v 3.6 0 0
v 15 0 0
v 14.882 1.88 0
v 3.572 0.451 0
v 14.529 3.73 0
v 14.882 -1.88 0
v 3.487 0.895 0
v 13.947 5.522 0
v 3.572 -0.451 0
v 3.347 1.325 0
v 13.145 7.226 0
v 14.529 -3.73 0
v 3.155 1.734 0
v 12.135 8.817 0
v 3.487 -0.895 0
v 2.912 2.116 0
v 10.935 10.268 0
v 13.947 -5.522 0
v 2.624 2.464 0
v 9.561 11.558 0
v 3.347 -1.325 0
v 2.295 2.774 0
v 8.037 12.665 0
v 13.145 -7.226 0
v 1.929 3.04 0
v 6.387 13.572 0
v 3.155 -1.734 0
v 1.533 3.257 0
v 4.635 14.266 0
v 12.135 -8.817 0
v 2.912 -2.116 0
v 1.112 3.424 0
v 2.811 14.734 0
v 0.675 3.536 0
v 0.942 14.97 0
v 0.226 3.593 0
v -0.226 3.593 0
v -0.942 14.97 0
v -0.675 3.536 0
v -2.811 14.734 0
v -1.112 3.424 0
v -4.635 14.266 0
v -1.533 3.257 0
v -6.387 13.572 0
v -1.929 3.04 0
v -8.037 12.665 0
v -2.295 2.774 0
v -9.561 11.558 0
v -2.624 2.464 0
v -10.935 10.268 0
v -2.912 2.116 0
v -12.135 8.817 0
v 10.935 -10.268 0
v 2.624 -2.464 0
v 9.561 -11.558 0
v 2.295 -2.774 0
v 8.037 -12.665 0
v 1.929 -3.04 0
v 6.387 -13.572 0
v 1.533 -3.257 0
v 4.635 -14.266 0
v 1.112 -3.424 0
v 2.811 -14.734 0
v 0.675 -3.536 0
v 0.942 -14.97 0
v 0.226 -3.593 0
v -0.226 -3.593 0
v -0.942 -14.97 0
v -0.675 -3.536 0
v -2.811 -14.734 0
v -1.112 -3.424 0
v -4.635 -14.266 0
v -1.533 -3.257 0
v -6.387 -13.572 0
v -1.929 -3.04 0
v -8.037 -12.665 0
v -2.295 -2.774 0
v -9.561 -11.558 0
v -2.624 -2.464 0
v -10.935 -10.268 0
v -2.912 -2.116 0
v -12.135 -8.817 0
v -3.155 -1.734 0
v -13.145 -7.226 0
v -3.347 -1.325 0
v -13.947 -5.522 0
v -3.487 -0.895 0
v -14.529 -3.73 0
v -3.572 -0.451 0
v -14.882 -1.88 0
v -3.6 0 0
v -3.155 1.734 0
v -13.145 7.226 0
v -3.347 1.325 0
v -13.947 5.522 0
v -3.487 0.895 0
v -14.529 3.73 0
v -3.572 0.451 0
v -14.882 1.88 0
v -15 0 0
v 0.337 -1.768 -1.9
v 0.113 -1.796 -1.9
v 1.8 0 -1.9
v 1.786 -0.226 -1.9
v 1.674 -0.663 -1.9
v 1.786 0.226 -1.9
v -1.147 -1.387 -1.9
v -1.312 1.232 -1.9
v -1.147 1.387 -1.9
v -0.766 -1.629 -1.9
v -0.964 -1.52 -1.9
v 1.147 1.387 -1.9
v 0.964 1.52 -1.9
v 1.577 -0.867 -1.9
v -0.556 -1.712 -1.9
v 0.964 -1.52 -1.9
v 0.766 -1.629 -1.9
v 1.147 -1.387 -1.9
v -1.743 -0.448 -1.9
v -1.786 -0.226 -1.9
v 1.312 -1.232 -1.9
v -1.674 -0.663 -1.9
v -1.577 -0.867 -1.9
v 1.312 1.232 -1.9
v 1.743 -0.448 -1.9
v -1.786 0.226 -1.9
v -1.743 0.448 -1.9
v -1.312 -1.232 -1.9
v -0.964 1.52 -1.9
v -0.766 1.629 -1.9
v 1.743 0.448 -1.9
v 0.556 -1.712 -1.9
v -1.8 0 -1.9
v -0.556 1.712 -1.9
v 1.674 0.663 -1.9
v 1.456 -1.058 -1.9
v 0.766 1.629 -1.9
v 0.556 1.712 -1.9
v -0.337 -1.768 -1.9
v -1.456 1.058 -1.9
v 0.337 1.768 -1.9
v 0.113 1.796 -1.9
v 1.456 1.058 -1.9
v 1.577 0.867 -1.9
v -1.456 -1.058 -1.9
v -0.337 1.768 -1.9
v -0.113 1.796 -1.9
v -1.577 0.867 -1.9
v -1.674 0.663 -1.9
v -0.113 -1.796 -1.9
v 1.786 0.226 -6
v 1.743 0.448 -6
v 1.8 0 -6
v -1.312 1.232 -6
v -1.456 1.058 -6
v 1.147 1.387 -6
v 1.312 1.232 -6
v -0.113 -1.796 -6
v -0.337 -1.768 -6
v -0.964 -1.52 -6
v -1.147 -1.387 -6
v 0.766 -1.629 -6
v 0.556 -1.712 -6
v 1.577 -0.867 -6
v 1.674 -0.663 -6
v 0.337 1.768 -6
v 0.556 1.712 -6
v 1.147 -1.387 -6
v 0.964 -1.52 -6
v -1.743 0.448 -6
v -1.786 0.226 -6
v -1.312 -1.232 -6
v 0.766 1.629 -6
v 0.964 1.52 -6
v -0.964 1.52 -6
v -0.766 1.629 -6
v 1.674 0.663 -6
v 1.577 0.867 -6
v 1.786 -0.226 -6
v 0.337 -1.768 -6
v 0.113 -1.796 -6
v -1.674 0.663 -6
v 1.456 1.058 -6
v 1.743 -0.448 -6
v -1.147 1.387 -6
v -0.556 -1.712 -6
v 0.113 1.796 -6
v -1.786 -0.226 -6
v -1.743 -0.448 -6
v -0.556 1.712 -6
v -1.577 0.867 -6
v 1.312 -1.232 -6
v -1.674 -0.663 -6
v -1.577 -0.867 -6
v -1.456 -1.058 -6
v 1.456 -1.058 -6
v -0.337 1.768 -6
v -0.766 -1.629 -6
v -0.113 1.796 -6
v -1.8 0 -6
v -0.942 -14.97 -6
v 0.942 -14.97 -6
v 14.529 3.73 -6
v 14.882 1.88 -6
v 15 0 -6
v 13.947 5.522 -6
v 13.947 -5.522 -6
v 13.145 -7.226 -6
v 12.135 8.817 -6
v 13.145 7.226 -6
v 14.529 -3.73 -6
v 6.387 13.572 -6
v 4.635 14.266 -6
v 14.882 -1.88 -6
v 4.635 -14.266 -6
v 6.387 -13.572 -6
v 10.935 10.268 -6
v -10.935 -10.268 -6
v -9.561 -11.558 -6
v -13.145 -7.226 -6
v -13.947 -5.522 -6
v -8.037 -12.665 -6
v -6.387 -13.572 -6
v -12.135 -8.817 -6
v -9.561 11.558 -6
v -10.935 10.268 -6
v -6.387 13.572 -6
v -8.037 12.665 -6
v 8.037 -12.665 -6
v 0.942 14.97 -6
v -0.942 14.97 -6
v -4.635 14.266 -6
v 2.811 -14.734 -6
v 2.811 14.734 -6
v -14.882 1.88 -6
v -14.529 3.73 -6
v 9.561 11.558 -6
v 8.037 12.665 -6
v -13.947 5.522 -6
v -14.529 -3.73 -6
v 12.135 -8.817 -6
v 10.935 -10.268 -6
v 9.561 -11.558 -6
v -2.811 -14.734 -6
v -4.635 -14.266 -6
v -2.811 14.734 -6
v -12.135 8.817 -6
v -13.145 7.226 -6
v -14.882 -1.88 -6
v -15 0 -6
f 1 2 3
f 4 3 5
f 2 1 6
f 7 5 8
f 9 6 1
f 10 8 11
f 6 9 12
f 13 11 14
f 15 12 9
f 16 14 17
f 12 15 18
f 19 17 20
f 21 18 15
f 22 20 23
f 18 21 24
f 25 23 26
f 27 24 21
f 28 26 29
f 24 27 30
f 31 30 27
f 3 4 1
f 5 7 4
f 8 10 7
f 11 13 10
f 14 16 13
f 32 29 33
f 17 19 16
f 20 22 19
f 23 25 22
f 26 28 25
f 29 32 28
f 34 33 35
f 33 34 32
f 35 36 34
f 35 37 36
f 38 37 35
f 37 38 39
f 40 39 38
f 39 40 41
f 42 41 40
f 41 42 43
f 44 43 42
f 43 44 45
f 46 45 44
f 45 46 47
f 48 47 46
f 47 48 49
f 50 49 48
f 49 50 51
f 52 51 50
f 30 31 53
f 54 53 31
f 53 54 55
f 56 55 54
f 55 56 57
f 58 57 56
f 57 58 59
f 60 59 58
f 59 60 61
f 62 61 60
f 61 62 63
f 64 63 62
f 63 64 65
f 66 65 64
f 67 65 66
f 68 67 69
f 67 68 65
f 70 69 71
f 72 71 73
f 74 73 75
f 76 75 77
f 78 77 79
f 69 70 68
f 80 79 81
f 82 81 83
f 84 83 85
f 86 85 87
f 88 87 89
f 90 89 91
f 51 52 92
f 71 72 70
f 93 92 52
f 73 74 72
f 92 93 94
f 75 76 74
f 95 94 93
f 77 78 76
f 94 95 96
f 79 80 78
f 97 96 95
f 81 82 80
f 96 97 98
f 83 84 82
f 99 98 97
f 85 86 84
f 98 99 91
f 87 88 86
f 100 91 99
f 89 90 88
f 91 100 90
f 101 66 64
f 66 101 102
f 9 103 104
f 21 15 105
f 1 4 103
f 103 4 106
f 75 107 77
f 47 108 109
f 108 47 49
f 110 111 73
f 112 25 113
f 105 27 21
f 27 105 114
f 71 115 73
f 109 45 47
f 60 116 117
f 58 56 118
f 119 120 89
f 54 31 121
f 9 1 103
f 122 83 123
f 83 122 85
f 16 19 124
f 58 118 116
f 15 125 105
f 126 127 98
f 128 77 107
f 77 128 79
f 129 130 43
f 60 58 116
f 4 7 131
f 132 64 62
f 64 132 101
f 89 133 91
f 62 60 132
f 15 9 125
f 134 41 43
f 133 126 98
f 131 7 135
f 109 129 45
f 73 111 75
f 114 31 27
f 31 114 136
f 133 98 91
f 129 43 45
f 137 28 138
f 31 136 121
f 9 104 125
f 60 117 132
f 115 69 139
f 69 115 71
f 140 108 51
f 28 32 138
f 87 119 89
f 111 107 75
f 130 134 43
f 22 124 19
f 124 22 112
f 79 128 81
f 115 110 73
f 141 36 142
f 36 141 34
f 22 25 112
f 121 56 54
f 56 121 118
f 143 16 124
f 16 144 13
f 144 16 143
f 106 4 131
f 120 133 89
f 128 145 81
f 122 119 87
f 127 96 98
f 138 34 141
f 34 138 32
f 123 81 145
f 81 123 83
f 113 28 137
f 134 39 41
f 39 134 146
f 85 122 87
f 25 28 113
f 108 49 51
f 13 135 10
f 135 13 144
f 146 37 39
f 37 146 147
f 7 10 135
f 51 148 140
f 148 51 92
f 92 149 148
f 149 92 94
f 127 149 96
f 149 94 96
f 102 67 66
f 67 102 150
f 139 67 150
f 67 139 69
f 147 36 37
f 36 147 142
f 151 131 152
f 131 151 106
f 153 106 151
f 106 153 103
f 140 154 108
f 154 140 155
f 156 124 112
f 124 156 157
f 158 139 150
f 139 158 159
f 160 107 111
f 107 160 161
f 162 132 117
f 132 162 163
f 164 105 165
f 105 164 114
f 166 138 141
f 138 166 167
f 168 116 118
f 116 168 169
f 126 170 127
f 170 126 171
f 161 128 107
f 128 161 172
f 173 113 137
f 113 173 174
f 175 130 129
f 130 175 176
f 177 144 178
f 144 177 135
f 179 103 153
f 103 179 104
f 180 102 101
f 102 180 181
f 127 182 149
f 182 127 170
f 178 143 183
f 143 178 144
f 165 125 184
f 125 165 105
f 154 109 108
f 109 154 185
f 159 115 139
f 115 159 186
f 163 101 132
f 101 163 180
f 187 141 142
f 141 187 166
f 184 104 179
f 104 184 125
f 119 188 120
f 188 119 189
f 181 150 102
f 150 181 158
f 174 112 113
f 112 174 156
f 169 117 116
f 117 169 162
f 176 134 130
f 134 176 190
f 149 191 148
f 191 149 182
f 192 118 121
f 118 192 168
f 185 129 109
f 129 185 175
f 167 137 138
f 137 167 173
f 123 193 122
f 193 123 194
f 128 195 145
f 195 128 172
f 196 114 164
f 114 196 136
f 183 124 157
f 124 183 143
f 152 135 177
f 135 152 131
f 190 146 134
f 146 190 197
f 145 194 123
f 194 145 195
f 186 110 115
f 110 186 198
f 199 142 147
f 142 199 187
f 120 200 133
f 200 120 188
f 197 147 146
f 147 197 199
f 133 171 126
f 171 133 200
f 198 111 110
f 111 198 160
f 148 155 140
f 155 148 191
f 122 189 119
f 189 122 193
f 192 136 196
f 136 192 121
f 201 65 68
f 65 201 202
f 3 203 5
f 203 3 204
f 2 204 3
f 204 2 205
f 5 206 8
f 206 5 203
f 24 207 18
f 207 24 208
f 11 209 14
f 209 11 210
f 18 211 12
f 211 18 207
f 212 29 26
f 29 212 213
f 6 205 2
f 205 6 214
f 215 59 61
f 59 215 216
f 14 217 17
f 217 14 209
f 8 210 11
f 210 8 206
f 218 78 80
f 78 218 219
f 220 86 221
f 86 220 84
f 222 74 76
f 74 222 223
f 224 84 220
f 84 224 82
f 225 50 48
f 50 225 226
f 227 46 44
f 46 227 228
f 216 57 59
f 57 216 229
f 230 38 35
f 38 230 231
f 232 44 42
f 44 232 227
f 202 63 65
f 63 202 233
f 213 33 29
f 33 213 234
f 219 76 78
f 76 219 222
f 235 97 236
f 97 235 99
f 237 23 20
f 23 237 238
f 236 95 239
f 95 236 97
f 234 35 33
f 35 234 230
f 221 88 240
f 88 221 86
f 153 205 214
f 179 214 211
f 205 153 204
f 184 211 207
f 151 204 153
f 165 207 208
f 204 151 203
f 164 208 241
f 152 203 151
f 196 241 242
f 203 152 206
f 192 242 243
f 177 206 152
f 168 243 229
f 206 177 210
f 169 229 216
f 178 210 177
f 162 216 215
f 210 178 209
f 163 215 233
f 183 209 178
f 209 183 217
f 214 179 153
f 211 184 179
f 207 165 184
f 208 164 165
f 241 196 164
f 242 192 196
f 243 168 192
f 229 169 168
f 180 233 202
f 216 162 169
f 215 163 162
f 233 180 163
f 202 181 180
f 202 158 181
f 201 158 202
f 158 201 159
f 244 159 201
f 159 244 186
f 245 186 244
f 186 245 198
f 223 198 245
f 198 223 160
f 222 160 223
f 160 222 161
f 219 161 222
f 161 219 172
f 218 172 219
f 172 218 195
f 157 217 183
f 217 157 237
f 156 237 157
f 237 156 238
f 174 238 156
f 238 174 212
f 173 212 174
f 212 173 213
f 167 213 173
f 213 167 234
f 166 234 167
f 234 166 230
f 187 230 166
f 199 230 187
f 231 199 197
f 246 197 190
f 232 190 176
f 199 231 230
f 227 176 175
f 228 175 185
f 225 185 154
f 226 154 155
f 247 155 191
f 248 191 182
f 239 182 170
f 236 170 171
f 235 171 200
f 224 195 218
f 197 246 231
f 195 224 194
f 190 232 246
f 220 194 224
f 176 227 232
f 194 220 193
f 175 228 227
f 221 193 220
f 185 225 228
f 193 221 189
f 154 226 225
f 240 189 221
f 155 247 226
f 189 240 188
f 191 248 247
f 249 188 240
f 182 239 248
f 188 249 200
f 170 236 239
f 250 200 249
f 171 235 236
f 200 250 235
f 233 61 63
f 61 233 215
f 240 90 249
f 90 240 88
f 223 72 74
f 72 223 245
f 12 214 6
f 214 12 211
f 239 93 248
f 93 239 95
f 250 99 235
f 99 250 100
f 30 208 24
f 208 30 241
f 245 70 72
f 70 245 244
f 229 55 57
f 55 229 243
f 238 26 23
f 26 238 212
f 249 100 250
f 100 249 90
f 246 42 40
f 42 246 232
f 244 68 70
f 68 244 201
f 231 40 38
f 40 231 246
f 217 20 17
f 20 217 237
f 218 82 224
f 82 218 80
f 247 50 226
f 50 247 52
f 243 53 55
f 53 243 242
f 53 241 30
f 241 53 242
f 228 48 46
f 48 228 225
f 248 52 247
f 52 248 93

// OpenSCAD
$fn = 50;


difference() {
	union() {
		translate(v = [0, 0, -6.0000000000]) {
			cylinder(h = 6, r = 15.0000000000);
		}
	}
	union() {
		translate(v = [0, 0, 0]) {
			rotate(a = [0, 0, 0]) {
				difference() {
					union() {
						translate(v = [0, 0, -9.0000000000]) {
							cylinder(h = 9, r = 1.5000000000);
						}
						translate(v = [0, 0, -1.9000000000]) {
							cylinder(h = 1.9000000000, r1 = 1.8000000000, r2 = 3.6000000000);
						}
						translate(v = [0, 0, -9.0000000000]) {
							cylinder(h = 9, r = 1.8000000000);
						}
						translate(v = [0, 0, -9.0000000000]) {
							cylinder(h = 9, r = 1.5000000000);
						}
					}
					union();
				}
			}
		}
	}
}
